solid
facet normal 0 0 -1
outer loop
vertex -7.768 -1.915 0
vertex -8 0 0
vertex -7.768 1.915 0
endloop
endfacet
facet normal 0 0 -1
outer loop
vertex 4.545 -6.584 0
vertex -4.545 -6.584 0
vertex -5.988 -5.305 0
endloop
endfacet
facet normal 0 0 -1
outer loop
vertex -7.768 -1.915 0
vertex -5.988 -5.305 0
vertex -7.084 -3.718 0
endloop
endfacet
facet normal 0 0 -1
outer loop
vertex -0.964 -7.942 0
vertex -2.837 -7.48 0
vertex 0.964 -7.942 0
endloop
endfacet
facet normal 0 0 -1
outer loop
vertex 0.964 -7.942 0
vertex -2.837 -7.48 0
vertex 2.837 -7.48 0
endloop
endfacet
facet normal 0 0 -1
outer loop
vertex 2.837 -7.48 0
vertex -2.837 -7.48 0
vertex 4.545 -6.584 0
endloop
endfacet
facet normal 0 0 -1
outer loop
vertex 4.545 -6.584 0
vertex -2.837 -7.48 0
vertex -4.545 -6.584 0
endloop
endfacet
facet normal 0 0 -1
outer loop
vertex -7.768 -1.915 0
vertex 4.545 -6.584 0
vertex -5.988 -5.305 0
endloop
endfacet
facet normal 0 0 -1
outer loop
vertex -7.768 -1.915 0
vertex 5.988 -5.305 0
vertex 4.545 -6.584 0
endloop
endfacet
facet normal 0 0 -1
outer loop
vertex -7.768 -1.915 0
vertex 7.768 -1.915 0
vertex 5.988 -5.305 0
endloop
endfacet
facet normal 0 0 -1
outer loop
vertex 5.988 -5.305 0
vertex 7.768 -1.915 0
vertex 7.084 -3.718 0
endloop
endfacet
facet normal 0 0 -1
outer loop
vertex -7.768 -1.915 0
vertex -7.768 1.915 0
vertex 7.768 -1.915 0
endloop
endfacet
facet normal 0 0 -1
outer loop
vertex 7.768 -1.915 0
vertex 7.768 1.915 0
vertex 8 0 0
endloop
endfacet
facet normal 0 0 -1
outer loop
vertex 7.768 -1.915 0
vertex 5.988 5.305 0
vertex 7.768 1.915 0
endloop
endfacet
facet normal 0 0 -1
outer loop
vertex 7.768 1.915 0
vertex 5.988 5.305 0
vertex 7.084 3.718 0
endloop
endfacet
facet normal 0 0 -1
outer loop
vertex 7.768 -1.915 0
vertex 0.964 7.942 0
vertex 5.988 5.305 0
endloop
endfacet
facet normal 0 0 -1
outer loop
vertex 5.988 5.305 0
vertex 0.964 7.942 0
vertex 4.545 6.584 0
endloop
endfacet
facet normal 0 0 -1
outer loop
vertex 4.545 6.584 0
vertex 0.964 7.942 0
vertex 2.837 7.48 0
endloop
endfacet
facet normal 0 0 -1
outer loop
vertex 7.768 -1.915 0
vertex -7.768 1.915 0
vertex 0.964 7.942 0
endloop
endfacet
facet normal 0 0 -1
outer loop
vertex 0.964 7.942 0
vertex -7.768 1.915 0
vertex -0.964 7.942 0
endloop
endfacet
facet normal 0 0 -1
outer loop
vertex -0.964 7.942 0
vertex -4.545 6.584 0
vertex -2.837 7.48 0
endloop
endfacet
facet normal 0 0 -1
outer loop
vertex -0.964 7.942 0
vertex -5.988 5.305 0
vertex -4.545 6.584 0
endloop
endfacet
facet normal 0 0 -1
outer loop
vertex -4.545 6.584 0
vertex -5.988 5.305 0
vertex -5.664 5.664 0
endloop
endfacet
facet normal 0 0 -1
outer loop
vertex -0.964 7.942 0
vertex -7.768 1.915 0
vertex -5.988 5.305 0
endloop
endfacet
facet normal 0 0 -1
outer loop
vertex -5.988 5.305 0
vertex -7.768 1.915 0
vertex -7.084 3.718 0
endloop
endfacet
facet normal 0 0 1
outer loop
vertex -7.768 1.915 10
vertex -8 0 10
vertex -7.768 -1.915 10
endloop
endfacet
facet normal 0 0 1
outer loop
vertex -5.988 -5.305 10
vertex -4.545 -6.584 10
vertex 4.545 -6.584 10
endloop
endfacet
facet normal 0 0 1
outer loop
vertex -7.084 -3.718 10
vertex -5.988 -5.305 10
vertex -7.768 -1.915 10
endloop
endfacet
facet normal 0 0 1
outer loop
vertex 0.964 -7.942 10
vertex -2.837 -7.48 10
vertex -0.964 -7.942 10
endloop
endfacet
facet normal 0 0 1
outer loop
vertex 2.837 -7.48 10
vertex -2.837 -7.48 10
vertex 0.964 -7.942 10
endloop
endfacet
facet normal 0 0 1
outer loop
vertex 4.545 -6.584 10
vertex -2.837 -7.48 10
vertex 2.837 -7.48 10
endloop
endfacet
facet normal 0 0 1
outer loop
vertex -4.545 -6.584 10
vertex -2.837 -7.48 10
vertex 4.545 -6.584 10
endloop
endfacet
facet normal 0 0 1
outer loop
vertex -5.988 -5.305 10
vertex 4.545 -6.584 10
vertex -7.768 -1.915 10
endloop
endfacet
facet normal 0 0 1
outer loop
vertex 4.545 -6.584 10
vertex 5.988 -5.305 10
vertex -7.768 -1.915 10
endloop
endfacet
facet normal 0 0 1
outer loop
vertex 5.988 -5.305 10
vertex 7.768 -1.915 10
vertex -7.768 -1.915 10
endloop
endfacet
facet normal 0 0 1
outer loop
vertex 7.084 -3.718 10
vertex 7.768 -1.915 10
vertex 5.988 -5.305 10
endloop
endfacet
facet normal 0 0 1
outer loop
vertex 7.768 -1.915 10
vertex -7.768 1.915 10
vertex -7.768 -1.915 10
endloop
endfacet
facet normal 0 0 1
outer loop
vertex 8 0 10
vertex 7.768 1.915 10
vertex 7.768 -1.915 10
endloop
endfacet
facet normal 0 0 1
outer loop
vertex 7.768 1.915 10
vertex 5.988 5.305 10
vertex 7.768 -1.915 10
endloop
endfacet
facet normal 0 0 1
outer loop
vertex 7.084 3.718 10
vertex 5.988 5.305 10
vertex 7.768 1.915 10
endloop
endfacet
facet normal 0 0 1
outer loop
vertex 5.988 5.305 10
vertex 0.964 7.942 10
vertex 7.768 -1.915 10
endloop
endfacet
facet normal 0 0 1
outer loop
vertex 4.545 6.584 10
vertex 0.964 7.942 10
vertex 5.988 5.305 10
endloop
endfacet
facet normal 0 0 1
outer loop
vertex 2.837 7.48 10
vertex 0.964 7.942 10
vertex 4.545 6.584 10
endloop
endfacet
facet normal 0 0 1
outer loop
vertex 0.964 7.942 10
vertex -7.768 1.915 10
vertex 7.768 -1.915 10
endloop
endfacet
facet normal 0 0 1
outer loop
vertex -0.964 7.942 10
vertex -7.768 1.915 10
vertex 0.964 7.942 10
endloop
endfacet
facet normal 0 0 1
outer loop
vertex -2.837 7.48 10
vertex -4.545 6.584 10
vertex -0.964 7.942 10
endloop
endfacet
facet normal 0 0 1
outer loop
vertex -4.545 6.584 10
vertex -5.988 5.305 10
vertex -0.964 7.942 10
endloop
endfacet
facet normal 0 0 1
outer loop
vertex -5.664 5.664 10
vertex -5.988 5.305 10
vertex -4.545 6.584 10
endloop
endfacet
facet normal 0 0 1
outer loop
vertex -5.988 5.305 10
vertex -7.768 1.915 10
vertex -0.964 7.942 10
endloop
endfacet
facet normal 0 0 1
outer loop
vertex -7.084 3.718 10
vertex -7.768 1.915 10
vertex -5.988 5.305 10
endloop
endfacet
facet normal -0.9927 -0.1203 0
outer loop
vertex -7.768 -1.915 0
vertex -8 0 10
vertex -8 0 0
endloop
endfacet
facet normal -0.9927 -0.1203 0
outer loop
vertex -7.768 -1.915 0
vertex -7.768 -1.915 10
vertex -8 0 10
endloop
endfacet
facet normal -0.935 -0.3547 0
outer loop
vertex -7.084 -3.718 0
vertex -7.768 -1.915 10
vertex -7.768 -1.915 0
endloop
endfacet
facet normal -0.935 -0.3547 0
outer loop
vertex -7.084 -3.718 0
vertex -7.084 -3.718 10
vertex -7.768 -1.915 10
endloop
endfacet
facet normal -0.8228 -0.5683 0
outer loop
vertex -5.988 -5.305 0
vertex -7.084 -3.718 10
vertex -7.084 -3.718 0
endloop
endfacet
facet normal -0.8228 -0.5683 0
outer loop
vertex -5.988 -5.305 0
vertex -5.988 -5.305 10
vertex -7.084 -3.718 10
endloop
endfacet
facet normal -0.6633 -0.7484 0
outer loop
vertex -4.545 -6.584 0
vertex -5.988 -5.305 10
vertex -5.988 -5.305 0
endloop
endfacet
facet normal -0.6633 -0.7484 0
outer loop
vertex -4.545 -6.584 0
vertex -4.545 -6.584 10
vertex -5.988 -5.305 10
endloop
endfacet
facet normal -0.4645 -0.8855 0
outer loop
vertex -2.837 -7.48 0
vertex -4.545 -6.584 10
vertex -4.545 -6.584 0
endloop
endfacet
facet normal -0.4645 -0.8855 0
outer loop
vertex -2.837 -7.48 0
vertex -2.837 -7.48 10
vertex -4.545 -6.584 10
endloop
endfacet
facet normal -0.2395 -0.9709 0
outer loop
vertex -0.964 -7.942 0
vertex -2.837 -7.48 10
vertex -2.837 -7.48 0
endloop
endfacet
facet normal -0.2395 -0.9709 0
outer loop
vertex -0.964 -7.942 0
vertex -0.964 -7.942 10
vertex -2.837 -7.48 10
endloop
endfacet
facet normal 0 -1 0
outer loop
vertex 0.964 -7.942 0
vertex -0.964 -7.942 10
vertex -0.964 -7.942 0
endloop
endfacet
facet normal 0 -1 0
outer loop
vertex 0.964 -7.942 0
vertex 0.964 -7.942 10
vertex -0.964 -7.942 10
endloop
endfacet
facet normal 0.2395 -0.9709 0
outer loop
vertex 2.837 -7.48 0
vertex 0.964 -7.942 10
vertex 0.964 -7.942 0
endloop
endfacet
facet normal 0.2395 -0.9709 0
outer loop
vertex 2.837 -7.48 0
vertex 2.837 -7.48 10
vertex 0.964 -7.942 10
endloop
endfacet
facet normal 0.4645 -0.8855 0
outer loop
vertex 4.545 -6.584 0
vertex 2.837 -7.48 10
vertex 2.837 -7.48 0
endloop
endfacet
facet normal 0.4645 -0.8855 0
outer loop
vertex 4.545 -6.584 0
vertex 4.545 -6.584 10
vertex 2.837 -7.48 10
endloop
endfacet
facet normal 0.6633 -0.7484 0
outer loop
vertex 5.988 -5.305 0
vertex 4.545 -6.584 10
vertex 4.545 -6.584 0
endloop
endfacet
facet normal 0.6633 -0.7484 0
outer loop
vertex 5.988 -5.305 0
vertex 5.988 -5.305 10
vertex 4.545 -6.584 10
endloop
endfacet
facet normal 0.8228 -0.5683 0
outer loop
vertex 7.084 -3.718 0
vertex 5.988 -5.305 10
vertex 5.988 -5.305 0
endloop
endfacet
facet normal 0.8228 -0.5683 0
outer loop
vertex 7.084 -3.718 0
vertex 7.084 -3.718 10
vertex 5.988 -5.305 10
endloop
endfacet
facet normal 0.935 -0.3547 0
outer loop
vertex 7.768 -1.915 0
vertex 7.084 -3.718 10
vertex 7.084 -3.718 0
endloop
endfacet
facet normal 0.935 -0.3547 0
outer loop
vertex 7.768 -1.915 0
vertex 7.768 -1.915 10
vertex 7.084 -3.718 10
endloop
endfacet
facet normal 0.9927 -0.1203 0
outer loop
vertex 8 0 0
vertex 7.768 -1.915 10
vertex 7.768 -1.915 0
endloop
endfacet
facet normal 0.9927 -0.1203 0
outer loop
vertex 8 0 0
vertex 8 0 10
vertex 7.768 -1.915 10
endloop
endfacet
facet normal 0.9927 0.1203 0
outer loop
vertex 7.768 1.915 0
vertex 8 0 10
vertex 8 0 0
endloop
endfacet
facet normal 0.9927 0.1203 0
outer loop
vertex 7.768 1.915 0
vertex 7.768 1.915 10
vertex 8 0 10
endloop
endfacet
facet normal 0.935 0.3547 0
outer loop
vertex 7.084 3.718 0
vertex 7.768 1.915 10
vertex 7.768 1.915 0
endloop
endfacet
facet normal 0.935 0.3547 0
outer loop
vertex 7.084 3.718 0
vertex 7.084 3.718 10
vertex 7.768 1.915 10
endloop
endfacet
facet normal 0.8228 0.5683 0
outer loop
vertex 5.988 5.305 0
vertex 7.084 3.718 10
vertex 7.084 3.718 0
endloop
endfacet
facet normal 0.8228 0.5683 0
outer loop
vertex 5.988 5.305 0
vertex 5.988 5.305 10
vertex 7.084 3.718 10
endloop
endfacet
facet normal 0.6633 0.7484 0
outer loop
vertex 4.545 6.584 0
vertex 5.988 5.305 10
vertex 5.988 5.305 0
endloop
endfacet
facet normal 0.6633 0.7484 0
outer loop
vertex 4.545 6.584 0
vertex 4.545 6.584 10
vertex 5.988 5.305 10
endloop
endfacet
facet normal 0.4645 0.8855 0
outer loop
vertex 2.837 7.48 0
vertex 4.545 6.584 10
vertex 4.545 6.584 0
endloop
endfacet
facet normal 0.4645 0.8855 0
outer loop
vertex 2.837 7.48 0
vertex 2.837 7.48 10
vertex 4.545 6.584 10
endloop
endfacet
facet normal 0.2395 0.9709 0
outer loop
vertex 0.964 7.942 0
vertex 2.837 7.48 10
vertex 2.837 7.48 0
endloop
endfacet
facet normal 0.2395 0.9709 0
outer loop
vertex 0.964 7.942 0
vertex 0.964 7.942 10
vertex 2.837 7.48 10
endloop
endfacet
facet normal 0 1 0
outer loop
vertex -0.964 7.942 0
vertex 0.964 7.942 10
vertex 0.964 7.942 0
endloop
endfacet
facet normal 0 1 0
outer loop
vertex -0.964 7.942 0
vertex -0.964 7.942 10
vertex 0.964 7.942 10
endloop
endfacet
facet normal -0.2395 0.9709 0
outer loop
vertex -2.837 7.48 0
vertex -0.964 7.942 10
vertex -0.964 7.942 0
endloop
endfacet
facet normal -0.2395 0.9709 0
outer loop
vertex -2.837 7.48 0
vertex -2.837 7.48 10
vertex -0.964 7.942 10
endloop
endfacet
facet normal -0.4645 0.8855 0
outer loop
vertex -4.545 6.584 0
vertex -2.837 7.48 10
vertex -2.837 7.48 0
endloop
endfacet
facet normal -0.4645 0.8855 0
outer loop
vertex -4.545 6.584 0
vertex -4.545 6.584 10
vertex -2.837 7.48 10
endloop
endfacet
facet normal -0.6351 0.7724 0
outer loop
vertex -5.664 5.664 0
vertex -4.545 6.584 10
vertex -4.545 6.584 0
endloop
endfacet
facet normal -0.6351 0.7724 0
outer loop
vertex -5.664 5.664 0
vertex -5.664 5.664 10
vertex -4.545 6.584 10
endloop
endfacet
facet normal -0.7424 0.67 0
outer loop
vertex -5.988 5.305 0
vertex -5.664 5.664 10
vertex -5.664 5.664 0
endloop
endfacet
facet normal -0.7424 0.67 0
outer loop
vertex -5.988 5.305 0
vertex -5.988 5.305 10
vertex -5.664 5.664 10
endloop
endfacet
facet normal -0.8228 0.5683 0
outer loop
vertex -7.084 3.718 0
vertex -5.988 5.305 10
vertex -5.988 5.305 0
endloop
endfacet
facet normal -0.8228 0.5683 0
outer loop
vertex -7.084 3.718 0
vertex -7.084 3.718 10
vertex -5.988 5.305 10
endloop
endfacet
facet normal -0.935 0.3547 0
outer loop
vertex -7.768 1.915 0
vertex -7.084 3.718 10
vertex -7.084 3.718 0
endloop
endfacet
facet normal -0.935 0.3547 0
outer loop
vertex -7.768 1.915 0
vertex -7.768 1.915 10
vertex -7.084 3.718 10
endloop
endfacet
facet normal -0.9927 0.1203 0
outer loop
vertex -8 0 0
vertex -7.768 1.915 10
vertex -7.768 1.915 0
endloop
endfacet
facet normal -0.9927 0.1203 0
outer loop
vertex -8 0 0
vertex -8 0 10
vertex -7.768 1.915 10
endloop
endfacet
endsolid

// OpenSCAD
// BOSL-style teardrop - printable circular hole
module teardrop2d(r = 5, ang = 45) {
    hull() {
        circle(r = r);
        rotate([0, 0, 180 - ang])
            translate([r, 0, 0])
                circle(r = 0.01);
    }
}

linear_extrude(height = 10)
    teardrop2d(r = 8, ang = 45);
